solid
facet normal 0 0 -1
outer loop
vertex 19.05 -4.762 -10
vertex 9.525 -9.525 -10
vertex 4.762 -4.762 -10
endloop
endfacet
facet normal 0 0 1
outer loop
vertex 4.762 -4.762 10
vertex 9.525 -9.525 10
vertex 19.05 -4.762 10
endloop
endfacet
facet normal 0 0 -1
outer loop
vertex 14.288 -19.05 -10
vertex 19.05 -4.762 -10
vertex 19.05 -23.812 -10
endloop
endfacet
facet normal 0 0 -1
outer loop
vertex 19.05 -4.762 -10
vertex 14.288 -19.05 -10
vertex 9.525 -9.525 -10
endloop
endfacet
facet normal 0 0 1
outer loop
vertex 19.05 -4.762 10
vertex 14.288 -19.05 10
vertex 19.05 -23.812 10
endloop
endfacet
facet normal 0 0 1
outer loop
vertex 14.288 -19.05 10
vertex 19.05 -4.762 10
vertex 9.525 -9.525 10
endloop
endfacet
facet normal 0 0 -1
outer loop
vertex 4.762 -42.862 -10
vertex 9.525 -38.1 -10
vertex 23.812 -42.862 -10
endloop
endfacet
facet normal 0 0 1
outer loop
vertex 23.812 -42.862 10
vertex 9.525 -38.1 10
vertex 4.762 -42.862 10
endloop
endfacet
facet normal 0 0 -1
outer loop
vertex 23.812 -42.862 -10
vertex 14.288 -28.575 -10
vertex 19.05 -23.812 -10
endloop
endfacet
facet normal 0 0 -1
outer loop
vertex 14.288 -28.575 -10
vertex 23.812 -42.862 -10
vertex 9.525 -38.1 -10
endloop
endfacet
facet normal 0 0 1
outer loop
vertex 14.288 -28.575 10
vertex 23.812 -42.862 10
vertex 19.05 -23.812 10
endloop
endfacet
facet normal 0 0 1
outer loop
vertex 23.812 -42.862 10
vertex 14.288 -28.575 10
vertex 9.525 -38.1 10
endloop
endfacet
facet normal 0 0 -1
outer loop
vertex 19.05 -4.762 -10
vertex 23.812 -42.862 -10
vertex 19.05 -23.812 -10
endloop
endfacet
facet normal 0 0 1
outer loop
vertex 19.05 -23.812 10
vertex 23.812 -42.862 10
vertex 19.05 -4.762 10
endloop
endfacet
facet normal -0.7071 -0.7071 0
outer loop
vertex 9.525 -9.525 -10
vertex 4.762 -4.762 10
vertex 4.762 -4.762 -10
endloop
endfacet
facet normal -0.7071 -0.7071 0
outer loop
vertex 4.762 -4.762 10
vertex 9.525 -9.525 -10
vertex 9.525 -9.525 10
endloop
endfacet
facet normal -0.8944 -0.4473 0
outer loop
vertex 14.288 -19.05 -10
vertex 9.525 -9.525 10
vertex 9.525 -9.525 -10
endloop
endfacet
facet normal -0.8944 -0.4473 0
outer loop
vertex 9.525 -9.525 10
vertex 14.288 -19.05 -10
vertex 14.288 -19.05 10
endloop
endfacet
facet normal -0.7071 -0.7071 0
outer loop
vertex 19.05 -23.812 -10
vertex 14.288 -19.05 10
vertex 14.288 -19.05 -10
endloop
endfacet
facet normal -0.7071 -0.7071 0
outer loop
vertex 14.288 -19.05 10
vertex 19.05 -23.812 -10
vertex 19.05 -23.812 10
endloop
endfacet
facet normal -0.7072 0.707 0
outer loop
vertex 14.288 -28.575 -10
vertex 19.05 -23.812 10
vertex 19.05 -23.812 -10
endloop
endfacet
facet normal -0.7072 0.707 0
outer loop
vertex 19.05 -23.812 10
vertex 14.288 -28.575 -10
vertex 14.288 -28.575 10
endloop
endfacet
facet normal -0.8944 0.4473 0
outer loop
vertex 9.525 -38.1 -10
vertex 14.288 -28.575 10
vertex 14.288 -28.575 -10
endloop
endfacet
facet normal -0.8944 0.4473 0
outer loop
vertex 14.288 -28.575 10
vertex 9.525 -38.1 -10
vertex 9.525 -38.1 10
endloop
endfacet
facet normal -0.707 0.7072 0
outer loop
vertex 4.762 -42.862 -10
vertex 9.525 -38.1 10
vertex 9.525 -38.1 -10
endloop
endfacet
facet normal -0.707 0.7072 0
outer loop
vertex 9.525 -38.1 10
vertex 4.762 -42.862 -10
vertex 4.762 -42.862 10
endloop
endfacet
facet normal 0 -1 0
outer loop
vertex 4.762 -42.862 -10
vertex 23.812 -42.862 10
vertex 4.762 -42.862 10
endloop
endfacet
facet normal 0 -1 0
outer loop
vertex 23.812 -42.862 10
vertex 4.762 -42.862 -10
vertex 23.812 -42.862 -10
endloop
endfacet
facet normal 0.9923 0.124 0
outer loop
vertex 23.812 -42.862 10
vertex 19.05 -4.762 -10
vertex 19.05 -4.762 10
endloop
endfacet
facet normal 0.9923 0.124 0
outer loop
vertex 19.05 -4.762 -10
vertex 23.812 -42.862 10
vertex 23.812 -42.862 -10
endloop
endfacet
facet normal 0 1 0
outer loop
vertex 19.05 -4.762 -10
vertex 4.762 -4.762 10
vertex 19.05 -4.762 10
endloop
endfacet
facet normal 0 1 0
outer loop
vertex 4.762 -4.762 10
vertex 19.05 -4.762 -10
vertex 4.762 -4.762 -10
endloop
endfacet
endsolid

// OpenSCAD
polyhedron(
    points=[
    [4.7625, -4.7625, -10],
    [9.525, -9.525, -10],
    [14.2875, -19.05, -10],
    [19.05, -23.8125, -10],
    [14.2875, -28.575, -10],
    [9.525, -38.1, -10],
    [4.7625, -42.8625, -10],
    [23.8125, -42.8625, -10],
    [19.05, -4.7625, -10],
    [4.7625, -4.7625, 10],
    [9.525, -9.525, 10],
    [14.2875, -19.05, 10],
    [19.05, -23.8125, 10],
    [14.2875, -28.575, 10],
    [9.525, -38.1, 10],
    [4.7625, -42.8625, 10],
    [23.8125, -42.8625, 10],
    [19.05, -4.7625, 10],
    ],
    faces=[
        [0,1,8],
        [17,10,9],
        [1,2,3,8],
        [17,12,11,10],
        [7,5,6],
        [15,14,16],
        [7,3,4,5],
        [14,13,12,16],
        [3,7,8],
        [17,16,12],
        [0,9,10,1],
        [1,10,11,2],
        [2,11,12,3],
        [3,12,13,4],
        [4,13,14,5],
        [5,14,15,6],
        [6,15,16,7],
        [7,16,17,8],
        [8,17,9,0],
    ]
);
